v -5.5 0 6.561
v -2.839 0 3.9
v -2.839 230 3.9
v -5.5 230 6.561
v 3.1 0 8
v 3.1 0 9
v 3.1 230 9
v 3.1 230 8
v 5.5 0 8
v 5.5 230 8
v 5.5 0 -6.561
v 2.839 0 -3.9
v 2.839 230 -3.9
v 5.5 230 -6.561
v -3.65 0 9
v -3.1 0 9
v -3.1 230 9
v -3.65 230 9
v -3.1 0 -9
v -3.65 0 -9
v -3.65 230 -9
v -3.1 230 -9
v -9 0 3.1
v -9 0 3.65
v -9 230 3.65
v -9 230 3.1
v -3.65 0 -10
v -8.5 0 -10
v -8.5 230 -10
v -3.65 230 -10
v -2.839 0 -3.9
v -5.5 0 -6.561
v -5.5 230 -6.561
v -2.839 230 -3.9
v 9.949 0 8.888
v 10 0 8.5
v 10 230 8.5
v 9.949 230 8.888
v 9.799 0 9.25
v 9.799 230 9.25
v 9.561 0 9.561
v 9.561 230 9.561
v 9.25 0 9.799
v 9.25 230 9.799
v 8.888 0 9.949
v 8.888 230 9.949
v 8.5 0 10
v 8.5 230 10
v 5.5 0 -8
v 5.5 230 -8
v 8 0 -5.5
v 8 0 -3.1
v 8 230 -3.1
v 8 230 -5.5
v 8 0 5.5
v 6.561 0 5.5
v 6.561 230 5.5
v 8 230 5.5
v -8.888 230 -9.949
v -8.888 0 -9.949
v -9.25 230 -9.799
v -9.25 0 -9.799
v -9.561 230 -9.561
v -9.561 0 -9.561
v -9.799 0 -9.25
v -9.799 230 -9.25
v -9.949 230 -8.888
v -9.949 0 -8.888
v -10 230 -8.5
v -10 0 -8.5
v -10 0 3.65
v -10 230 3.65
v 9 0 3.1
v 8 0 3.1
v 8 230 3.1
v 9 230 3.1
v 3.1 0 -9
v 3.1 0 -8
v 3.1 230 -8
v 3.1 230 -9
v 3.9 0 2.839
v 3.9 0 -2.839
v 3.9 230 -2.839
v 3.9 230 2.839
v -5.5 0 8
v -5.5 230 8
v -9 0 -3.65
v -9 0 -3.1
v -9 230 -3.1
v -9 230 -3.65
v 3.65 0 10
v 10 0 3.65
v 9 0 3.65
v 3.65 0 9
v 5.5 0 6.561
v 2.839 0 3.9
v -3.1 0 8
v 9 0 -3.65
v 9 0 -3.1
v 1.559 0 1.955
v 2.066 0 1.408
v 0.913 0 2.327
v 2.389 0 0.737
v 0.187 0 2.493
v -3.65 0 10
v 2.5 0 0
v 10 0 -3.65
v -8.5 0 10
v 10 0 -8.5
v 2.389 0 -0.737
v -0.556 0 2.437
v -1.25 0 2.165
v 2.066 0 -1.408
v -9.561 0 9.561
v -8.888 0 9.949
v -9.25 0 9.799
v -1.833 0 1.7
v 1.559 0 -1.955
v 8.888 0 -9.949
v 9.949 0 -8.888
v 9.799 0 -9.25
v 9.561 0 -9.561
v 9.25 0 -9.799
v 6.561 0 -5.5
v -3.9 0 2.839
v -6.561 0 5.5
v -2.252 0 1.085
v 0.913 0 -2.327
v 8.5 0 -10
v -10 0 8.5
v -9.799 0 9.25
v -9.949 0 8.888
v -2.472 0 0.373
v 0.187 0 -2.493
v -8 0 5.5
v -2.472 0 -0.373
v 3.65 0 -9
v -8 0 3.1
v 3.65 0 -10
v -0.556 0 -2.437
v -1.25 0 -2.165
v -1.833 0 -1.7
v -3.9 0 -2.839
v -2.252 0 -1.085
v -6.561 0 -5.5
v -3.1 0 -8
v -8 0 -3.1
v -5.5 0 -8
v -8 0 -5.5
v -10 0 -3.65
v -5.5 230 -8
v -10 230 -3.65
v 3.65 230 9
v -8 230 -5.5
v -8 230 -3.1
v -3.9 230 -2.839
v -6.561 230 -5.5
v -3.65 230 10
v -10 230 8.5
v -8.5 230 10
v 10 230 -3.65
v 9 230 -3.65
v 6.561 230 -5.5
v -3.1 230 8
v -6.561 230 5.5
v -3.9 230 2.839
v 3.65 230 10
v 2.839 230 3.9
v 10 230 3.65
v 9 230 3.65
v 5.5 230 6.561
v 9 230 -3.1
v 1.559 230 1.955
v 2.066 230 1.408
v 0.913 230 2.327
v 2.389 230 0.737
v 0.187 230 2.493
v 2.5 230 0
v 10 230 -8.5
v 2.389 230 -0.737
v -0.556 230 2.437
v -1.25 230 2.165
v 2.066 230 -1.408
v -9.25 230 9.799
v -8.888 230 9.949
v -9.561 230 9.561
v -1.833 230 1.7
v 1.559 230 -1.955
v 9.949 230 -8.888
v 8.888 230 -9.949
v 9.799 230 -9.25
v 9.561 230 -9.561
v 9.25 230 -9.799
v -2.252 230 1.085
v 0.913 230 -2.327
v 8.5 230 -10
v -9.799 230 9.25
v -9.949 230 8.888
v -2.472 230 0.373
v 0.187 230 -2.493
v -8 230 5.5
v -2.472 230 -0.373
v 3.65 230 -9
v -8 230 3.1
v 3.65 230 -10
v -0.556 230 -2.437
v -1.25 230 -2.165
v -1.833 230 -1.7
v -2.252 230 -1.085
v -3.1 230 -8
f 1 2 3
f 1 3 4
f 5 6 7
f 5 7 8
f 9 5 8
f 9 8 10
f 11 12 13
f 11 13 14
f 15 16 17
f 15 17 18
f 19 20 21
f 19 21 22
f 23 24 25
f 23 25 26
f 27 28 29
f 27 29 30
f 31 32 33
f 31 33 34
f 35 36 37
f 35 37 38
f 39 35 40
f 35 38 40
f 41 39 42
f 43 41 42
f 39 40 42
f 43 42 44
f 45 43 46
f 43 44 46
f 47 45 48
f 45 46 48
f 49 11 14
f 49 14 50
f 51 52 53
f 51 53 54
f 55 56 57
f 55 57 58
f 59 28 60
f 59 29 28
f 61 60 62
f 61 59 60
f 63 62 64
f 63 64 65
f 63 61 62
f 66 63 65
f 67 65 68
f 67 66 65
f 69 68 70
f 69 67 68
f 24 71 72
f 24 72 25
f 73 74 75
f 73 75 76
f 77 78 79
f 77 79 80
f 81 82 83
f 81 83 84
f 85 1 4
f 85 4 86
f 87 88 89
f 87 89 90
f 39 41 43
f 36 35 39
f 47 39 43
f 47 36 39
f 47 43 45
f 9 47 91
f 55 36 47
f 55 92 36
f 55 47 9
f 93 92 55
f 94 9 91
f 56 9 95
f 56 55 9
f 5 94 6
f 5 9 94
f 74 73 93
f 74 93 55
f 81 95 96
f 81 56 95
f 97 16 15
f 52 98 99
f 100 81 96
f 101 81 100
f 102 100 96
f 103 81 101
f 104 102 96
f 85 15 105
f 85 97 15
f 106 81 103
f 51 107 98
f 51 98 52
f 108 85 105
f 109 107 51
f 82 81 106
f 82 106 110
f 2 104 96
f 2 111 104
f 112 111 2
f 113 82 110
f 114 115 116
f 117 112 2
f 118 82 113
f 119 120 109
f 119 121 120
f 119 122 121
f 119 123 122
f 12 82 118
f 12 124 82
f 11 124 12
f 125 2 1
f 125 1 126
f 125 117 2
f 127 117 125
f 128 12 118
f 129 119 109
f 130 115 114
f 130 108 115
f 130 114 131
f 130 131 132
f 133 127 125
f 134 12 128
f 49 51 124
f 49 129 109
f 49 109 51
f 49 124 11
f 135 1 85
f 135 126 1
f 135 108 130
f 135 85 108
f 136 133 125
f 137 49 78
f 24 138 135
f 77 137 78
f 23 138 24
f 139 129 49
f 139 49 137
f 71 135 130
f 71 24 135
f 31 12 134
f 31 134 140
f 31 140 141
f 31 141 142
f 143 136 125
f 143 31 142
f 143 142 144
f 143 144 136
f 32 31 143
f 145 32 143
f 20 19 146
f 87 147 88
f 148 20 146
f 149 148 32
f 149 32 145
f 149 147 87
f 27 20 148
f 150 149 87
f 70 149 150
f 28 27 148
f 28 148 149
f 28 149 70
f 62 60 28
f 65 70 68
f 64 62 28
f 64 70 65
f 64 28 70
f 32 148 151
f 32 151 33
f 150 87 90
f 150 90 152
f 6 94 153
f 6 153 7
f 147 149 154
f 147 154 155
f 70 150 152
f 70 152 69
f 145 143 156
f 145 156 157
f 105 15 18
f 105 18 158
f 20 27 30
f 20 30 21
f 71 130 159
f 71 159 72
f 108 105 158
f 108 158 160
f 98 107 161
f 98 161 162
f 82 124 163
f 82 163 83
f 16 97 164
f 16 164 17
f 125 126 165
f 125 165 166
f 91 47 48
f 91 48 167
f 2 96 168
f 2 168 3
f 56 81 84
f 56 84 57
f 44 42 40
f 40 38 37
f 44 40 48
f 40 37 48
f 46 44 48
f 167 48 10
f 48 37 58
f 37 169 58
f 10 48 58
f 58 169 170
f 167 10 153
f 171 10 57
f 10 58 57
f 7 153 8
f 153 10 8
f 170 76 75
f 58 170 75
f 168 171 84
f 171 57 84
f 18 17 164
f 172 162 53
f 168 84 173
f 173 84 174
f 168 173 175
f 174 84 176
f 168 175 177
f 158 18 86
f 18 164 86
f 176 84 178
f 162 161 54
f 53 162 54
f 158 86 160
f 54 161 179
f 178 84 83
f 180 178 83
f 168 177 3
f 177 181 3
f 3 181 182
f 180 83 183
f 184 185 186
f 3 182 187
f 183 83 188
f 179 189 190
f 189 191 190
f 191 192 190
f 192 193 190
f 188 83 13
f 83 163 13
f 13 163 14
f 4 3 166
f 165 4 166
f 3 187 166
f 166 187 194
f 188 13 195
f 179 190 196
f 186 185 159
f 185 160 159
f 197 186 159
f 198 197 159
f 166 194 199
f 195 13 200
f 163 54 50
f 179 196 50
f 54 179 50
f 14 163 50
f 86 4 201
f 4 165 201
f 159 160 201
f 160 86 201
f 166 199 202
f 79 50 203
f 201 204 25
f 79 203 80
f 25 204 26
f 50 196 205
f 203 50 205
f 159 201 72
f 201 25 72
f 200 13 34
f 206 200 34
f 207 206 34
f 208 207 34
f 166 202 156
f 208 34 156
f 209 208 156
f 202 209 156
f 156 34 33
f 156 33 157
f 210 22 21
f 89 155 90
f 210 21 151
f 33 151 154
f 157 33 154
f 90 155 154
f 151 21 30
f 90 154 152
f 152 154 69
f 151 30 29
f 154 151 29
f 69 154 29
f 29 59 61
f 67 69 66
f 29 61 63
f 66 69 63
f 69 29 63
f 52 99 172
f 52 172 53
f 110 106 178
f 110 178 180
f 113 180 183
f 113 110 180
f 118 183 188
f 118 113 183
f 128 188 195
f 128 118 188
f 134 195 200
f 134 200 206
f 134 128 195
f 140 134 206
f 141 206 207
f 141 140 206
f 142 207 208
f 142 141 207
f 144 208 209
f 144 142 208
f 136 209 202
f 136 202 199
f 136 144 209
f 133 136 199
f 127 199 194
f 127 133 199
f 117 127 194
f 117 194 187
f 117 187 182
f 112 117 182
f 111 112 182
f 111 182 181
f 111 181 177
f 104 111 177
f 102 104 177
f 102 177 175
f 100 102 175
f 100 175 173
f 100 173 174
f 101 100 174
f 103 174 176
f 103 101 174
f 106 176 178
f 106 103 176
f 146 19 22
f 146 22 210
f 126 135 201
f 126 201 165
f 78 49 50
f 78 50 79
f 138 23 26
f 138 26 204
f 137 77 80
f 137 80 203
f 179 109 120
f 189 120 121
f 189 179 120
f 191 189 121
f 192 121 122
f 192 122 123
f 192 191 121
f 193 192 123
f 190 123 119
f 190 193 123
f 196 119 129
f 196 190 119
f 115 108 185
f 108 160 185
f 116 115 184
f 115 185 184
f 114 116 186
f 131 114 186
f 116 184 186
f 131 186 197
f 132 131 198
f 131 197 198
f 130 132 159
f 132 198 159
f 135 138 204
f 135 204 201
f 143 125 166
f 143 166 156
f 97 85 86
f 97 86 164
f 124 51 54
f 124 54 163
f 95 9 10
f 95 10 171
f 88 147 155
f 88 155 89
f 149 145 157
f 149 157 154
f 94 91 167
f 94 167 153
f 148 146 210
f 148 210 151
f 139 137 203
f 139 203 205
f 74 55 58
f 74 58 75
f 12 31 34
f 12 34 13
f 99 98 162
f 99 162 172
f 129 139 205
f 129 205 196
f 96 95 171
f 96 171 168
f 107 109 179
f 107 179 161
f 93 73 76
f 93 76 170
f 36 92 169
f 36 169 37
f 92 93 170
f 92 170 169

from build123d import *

# Parameters (mm, degrees)
SKETCH_1_R      = 2.5
EXTRUDE_1_DEPTH = 230
FILLET_1_R      = 1.5


with BuildPart() as part:
    # 草图1 → 凸台-拉伸1 (new body)
    with BuildSketch(Plane(origin=(0, 0, 0), x_dir=(1, 0, 0), z_dir=(0, 1, 0))):
        Polygon((3.9, 2.839339828), (3.9, -2.839339828), (6.560660172, -5.5), (8, -5.5), (8, -3.1), (9, -3.1), (9, -3.65), (10, -3.65), (10, -10), (3.65, -10), (3.65, -9), (3.1, -9), (3.1, -8), (5.5, -8), (5.5, -6.560660172), (2.839339828, -3.9), (-2.839339828, -3.9), (-5.5, -6.560660172), (-5.5, -8), (-3.1, -8), (-3.1, -9), (-3.65, -9), (-3.65, -10), (-10, -10), (-10, -3.65), (-9, -3.65), (-9, -3.1), (-8, -3.1), (-8, -5.5), (-6.560660172, -5.5), (-3.9, -2.839339828), (-3.9, 2.839339828), (-6.560660172, 5.5), (-8, 5.5), (-8, 3.1), (-9, 3.1), (-9, 3.65), (-10, 3.65), (-10, 10), (-3.65, 10), (-3.65, 9), (-3.1, 9), (-3.1, 8), (-5.5, 8), (-5.5, 6.560660172), (-2.839339828, 3.9), (2.839339828, 3.9), (5.5, 6.560660172), (5.5, 8), (3.1, 8), (3.1, 9), (3.65, 9), (3.65, 10), (10, 10), (10, 3.65), (9, 3.65), (9, 3.1), (8, 3.1), (8, 5.5), (6.560660172, 5.5), align=None)
        Circle(SKETCH_1_R, mode=Mode.SUBTRACT)
    extrude(amount=EXTRUDE_1_DEPTH)

    # 圆角1
    fillet_1_edges = [part.edges().sort_by_distance(p)[0] for p in [
        (-10, 115, 10),
        (-10, 115, -10),
        (10, 115, -10),
        (10, 115, 10),
    ]]
    fillet(fillet_1_edges, radius=FILLET_1_R)


solid = part.part
